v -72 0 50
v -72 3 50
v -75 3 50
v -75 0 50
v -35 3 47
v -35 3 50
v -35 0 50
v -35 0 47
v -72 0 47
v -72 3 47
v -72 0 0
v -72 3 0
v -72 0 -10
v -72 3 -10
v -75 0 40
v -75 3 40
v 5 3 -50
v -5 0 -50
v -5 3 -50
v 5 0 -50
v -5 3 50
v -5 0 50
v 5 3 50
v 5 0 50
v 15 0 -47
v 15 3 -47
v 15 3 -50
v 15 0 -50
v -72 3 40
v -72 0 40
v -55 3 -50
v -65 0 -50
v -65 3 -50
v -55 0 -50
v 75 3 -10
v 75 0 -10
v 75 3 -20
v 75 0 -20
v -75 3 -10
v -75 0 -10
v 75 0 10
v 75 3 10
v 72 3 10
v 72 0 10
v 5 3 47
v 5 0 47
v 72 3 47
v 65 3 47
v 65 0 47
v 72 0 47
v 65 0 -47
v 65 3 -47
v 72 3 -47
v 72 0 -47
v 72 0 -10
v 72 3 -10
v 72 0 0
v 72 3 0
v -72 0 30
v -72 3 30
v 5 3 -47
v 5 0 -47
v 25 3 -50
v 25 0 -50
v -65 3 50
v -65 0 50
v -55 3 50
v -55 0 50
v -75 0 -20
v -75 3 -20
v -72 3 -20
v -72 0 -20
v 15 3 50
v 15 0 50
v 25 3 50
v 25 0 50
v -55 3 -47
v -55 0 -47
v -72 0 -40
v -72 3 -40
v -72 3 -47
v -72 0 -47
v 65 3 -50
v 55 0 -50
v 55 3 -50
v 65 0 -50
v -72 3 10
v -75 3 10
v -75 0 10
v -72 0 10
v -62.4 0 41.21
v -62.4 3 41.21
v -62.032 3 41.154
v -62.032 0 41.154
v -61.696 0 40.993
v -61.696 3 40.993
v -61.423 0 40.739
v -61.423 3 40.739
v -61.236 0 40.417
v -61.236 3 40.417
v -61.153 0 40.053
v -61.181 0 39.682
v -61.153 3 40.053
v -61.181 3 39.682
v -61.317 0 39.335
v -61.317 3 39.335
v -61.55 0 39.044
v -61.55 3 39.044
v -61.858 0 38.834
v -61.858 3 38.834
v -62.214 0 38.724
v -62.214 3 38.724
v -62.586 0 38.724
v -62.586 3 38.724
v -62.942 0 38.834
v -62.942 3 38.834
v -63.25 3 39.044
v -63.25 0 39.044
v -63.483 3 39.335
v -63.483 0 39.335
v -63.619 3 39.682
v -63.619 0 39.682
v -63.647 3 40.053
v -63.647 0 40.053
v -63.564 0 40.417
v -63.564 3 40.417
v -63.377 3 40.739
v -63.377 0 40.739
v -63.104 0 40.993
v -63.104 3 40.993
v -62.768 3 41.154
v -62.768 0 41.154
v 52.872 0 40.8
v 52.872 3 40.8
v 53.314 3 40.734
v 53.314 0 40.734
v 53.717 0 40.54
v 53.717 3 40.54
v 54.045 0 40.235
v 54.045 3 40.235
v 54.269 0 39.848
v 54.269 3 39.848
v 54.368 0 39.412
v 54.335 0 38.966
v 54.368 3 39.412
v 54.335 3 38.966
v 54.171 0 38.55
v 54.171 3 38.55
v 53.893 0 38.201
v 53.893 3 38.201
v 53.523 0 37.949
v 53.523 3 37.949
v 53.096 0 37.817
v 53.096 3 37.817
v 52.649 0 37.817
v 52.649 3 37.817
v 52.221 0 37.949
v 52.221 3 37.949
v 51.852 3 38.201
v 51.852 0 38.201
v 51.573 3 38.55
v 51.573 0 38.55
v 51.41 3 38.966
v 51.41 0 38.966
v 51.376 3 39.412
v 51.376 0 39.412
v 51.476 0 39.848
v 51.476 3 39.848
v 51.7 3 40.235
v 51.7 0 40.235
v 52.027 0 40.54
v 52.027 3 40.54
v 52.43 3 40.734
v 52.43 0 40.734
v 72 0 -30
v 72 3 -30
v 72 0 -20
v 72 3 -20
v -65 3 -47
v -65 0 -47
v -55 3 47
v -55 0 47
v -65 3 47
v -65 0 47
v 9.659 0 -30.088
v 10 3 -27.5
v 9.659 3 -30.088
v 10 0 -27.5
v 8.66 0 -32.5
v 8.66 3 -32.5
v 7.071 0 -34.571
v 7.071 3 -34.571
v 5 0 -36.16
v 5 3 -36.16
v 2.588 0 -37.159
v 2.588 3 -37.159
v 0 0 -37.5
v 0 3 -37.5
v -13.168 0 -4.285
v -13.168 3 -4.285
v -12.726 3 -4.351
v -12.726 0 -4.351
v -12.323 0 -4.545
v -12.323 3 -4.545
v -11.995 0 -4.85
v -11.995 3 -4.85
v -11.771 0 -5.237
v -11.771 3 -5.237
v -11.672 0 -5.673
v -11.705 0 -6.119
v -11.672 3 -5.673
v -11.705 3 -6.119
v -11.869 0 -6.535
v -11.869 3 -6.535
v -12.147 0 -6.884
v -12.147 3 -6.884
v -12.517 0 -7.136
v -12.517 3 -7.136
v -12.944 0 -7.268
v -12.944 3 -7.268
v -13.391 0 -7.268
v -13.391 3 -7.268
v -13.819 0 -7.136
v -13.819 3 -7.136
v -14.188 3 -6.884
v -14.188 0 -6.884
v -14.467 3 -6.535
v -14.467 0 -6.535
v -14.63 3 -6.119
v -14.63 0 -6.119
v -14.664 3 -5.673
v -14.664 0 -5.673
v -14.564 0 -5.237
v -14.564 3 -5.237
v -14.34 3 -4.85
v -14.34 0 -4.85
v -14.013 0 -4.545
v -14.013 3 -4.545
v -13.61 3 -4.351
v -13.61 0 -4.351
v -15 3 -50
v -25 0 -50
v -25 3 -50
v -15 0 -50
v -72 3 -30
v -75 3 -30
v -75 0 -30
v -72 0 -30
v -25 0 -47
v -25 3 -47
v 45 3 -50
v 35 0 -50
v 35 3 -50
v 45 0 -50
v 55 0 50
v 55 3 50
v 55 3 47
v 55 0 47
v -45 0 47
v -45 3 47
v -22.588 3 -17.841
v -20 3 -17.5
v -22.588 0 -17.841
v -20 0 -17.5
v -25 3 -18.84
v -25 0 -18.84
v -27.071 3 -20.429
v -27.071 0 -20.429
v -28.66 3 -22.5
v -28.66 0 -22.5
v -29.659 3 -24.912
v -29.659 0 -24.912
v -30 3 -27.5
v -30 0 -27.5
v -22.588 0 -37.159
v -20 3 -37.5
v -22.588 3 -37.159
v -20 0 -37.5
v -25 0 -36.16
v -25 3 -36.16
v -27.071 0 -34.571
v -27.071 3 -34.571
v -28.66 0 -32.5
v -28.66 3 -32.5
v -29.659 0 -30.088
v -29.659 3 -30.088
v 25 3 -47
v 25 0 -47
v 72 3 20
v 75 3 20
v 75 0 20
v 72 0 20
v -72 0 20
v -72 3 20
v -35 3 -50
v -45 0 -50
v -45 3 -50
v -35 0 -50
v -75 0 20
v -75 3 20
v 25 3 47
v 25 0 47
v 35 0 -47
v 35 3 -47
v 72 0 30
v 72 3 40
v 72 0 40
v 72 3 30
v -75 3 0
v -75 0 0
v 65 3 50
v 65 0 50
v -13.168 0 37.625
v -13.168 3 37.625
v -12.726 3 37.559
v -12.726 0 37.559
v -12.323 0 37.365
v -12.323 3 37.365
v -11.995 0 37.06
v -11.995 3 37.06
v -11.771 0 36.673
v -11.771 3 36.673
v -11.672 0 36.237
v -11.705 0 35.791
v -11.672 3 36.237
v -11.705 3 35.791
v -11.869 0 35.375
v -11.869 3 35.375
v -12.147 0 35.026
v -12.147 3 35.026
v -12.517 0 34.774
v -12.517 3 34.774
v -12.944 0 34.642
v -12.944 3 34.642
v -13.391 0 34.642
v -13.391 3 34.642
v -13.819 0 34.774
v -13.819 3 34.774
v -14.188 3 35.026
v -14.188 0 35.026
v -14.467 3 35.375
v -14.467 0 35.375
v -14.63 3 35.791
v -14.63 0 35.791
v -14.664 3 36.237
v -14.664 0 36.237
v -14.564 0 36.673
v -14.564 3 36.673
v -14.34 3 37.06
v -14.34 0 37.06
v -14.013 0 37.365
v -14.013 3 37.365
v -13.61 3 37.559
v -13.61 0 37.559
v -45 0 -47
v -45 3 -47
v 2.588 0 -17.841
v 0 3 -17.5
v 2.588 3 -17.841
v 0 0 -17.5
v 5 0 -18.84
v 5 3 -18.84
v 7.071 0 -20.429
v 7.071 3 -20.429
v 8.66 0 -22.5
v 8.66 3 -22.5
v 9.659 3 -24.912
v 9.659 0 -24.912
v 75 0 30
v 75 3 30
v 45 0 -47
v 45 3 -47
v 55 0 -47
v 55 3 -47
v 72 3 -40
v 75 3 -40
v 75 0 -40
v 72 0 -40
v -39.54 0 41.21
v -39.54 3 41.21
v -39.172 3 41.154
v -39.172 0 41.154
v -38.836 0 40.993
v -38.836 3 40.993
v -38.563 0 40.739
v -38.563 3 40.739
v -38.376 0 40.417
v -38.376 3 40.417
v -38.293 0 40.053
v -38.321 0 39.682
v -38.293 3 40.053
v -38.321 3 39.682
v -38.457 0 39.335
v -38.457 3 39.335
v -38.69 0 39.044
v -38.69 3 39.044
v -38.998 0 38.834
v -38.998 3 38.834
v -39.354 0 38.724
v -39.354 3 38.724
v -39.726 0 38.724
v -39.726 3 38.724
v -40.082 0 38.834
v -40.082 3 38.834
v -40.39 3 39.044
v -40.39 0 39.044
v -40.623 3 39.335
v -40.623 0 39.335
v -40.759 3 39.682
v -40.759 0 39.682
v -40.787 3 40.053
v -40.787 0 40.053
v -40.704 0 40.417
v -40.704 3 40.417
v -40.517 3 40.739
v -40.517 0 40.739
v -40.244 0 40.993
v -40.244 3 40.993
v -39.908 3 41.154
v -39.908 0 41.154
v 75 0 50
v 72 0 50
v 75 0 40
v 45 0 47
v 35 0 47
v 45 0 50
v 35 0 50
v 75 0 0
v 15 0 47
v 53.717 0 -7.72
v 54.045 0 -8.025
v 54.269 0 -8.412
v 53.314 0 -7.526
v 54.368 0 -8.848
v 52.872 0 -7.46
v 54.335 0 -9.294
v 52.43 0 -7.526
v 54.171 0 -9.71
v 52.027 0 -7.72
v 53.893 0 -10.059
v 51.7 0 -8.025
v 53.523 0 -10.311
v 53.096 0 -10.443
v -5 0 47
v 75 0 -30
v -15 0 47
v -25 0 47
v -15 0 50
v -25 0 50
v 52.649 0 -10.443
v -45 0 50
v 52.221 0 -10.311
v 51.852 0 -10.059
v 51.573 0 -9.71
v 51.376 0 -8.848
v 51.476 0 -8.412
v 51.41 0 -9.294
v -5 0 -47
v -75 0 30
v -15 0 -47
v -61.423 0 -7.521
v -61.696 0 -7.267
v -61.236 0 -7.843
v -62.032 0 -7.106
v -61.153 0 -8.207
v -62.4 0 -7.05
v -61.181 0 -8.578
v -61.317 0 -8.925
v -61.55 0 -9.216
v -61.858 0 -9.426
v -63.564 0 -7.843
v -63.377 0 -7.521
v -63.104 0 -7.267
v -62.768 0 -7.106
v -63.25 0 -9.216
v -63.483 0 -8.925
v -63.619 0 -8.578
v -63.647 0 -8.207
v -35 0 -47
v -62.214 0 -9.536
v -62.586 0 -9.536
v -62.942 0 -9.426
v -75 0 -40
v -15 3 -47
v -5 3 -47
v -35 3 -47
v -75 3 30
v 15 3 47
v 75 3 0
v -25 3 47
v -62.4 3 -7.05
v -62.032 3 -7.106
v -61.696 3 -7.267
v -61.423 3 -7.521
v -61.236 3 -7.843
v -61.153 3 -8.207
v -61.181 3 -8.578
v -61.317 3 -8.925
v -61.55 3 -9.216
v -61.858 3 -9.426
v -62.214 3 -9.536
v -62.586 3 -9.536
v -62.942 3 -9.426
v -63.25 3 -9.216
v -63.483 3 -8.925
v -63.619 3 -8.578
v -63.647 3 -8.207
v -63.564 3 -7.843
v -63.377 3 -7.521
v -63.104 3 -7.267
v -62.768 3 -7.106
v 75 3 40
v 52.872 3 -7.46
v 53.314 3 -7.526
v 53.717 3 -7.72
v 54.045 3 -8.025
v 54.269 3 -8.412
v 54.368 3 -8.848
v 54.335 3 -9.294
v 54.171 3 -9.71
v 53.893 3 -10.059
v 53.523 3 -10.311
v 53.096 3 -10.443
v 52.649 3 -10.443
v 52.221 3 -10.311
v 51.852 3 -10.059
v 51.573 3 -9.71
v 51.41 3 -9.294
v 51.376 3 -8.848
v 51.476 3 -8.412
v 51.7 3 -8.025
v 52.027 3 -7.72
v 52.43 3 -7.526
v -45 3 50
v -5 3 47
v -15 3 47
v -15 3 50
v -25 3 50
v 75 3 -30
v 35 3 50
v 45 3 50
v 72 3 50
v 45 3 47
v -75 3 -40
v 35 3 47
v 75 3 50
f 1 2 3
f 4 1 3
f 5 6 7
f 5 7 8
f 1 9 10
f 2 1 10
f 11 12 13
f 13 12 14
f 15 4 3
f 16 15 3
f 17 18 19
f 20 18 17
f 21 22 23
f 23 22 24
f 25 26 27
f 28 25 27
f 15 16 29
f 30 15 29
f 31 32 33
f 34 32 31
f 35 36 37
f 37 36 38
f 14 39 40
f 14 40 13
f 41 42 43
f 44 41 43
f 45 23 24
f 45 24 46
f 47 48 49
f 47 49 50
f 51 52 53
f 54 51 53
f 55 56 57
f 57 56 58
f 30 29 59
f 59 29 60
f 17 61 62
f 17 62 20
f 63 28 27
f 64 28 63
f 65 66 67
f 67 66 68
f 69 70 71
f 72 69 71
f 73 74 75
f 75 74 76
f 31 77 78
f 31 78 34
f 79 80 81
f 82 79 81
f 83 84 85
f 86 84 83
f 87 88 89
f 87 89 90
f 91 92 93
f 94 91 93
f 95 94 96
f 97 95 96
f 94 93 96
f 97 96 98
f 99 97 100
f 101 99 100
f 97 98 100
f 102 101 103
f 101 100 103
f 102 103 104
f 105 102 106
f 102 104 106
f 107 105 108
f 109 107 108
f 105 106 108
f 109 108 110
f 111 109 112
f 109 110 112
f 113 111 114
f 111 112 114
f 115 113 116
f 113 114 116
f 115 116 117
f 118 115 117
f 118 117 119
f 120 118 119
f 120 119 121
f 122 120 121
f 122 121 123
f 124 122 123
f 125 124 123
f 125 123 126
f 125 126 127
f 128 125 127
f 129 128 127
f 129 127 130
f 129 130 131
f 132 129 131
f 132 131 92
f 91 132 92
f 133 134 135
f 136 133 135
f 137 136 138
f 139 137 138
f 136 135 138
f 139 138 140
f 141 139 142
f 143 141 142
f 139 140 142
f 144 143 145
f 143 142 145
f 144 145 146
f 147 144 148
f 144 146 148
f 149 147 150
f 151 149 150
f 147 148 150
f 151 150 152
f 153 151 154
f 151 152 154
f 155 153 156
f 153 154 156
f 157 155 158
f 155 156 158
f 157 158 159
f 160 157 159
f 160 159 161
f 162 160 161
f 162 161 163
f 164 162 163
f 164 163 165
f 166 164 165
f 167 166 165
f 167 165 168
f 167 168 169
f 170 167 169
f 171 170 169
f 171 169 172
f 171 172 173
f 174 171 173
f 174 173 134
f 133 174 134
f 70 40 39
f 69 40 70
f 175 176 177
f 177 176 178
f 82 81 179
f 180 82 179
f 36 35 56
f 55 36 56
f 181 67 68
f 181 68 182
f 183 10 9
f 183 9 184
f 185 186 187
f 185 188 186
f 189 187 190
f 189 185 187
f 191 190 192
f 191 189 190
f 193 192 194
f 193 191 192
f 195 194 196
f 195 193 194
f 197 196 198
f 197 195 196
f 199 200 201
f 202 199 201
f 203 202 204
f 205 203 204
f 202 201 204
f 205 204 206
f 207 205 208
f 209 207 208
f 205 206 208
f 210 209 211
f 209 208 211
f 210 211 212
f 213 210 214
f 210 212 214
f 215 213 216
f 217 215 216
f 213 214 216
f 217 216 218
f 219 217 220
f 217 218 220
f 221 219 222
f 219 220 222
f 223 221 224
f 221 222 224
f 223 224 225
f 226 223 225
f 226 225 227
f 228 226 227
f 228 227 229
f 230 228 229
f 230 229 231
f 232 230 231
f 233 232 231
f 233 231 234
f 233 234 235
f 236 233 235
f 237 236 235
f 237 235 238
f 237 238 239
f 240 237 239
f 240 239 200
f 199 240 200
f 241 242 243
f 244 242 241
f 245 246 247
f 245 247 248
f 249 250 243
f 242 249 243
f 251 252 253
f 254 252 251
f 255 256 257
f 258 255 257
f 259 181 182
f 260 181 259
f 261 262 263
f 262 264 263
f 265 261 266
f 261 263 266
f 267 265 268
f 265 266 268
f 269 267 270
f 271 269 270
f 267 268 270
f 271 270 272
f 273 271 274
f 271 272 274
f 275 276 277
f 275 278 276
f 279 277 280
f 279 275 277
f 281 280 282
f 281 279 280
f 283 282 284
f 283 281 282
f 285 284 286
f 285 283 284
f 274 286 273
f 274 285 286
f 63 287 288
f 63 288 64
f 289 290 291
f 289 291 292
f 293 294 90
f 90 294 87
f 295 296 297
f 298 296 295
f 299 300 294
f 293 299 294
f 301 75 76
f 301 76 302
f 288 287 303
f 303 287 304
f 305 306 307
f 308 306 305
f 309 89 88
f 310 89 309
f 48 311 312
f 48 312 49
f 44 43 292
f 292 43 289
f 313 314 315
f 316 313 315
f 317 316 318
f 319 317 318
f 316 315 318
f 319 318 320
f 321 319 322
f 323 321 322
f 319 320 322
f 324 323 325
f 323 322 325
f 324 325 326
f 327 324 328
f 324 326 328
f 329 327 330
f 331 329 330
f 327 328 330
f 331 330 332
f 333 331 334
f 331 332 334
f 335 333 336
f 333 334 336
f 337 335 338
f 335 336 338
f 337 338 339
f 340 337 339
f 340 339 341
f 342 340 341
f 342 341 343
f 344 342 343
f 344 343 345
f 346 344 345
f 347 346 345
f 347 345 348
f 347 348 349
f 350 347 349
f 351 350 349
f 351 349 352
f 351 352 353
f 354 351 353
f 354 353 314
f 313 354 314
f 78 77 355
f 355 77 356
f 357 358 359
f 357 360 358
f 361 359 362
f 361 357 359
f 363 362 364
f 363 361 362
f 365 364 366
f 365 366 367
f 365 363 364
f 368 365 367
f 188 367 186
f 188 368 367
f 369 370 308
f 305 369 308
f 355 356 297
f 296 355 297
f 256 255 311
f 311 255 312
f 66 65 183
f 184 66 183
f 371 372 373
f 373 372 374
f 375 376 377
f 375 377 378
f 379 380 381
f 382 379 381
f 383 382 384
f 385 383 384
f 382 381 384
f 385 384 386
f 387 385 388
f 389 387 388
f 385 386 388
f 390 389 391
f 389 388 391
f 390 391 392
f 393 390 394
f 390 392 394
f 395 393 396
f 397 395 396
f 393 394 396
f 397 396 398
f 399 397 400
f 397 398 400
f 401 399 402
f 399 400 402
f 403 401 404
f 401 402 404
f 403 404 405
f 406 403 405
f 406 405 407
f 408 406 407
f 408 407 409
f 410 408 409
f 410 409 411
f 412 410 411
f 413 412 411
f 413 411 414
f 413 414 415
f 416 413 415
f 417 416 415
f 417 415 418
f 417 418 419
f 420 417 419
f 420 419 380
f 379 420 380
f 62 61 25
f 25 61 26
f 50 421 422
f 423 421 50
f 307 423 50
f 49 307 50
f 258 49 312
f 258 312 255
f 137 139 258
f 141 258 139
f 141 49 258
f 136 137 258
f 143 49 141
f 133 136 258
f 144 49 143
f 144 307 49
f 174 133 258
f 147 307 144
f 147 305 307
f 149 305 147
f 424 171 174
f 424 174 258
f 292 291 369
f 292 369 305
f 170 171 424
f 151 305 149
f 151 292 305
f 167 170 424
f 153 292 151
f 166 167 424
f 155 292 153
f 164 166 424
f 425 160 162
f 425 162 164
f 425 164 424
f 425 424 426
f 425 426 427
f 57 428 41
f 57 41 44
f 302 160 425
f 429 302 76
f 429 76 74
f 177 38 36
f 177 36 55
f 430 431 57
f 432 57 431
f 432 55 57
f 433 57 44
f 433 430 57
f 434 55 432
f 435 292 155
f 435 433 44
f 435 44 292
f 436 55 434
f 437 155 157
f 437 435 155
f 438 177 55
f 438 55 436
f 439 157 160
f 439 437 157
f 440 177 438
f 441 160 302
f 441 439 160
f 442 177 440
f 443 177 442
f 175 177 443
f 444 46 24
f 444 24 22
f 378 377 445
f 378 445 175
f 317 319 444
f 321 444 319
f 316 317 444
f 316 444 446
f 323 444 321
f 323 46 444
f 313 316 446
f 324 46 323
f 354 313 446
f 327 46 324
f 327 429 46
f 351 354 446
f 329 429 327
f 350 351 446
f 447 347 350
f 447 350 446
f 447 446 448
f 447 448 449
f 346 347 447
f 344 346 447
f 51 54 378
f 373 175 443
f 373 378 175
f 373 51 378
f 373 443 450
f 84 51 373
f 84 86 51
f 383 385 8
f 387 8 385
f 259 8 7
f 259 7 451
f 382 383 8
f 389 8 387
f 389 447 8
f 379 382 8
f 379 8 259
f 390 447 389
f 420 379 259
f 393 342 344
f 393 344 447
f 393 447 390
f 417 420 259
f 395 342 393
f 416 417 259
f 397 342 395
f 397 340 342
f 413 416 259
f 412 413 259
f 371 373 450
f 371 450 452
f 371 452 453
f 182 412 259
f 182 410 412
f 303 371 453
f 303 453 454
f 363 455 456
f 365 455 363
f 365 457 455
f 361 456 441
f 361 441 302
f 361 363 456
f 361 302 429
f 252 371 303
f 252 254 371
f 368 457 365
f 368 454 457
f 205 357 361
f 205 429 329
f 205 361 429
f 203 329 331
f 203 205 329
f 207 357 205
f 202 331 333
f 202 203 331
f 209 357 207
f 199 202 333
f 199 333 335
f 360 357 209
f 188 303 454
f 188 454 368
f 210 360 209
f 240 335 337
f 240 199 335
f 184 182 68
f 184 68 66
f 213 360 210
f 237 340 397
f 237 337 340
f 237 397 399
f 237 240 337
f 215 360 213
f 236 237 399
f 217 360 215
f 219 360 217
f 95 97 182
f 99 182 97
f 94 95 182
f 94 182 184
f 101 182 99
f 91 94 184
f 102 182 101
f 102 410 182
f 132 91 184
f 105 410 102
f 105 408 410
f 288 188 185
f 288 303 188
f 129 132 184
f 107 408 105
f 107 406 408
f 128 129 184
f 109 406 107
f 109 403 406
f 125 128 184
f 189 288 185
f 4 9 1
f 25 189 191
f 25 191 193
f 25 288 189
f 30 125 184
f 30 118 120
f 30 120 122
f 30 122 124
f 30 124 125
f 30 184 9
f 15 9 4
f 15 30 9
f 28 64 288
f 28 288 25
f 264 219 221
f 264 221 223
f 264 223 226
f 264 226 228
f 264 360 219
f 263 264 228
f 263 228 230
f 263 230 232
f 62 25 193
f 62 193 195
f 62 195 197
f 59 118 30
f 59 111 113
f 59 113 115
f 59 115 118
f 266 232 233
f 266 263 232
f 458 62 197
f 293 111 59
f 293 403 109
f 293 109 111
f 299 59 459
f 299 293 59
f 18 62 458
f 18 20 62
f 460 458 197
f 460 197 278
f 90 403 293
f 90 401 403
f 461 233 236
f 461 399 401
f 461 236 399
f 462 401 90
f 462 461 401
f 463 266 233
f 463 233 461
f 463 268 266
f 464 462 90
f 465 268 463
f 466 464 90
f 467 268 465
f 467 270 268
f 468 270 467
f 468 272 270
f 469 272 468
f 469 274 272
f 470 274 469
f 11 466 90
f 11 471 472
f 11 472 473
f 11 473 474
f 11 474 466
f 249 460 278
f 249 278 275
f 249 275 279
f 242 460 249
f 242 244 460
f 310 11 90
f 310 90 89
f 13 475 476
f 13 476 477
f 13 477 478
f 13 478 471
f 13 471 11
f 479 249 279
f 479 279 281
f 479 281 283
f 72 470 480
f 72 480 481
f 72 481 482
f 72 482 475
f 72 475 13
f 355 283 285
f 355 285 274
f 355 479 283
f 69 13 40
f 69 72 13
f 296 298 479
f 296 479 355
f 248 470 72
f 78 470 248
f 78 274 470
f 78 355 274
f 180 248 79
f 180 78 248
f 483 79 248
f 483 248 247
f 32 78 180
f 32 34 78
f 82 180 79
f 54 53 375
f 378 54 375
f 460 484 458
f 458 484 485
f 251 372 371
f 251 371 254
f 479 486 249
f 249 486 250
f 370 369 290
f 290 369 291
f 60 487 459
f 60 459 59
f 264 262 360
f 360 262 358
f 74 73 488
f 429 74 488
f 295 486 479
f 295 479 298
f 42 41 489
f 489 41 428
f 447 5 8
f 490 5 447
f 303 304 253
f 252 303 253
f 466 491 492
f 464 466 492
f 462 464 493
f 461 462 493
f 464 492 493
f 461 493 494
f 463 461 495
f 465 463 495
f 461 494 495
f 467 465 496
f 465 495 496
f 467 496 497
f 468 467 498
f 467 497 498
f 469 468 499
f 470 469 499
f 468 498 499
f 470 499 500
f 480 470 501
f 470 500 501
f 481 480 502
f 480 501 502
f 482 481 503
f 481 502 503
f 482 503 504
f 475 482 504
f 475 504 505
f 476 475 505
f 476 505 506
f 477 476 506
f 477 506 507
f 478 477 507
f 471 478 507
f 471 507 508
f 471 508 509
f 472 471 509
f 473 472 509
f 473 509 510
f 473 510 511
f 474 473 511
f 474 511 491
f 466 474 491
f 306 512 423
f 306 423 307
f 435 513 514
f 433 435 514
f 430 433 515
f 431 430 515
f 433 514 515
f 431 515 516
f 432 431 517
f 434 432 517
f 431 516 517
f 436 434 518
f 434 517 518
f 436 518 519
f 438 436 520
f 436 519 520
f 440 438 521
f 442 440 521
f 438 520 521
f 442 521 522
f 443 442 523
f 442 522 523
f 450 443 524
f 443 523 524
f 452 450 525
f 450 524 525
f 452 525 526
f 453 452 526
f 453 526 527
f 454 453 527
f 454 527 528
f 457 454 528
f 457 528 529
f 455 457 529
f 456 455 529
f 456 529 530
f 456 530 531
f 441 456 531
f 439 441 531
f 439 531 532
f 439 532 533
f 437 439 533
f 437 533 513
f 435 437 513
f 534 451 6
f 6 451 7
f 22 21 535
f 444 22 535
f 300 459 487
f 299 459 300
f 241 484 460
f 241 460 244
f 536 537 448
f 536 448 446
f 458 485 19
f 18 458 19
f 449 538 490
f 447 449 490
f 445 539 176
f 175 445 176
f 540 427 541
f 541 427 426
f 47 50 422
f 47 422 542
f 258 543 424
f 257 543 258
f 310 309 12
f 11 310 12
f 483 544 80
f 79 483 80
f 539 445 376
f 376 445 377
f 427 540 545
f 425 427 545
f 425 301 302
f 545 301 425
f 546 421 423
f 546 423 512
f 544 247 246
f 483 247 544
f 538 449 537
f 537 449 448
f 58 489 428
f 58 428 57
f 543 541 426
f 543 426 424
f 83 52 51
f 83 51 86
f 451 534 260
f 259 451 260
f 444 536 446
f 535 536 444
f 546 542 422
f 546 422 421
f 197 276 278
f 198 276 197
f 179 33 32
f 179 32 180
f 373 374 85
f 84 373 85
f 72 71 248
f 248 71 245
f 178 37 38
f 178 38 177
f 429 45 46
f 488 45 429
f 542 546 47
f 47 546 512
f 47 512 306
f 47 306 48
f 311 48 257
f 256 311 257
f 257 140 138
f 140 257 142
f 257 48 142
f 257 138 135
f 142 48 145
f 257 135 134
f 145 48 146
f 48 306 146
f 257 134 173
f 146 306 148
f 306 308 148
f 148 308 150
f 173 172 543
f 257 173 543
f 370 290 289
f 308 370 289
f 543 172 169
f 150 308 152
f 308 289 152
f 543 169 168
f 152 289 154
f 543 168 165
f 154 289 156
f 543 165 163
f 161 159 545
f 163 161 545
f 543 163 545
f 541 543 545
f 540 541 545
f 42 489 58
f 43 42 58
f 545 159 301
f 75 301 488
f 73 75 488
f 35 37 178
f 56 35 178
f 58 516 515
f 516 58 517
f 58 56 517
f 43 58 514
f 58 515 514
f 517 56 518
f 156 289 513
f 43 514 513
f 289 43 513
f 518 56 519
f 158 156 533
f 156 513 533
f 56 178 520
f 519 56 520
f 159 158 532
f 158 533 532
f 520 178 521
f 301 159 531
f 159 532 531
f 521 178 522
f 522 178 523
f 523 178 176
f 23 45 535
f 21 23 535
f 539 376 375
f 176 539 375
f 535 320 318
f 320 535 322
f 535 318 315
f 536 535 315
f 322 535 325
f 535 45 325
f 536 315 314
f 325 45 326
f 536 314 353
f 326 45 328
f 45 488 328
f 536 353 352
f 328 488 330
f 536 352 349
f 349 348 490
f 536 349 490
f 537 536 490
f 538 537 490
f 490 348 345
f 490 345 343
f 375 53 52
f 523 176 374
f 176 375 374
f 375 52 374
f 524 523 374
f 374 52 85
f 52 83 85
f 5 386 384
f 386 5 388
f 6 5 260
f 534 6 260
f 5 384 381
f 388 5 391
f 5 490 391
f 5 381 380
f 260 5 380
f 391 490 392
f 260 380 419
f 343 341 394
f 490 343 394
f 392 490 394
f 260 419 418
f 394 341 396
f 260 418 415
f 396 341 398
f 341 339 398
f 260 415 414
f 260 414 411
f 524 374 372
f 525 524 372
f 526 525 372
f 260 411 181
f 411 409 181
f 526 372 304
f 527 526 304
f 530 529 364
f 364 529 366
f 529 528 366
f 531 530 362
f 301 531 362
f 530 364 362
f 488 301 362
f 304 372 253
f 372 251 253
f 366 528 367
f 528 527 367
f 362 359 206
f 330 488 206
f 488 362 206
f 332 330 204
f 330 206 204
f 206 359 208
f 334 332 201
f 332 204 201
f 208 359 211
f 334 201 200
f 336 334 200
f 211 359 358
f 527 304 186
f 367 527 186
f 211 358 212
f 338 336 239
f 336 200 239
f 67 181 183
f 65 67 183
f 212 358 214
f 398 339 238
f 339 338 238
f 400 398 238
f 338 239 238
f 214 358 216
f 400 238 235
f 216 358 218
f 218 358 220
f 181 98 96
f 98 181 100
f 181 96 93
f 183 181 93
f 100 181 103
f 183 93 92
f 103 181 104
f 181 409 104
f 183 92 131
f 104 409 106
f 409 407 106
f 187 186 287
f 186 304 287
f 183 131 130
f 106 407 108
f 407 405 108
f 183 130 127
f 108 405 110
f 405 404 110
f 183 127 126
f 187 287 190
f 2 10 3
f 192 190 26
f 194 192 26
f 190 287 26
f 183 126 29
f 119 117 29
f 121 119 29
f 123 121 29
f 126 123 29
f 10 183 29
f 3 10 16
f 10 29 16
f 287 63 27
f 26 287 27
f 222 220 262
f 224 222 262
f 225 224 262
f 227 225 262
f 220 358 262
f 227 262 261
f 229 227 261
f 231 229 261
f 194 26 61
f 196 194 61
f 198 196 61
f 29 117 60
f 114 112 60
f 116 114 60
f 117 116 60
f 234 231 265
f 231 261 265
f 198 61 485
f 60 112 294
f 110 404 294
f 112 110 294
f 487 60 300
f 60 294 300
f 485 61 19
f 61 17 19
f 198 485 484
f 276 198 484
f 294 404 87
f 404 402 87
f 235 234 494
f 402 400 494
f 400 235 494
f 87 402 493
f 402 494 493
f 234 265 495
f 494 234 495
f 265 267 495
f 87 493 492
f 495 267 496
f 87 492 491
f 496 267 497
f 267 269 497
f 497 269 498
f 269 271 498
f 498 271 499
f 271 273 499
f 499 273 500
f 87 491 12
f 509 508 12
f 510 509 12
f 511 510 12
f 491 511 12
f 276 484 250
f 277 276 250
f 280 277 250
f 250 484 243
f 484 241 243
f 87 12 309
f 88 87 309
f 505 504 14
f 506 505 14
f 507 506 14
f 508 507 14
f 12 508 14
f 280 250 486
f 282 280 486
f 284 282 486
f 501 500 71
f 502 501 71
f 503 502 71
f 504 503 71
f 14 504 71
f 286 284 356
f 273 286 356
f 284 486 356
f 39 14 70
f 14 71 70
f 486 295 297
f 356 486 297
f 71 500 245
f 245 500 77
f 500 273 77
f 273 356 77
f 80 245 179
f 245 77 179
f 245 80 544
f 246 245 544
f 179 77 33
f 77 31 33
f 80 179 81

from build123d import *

# Parameters (mm, degrees)
SKETCH1_W               = 150
SKETCH1_H               = 100
BOSS_EXTRUDE1_DEPTH     = 3
SKETCH2_W               = 10
SKETCH2_H               = 3
CUT_EXTRUDE2_DEPTH      = 91.188691087
LPATTERN1_COUNT         = 8
LPATTERN1_PITCH         = 20
MIRROR1_COPY_1_SKETCH_W = 10
MIRROR1_COPY_1_SKETCH_H = 3
MIRROR1_COPY_1_DEPTH    = 91.188691087
MIRROR1_COPY_2_SKETCH_W = 10
MIRROR1_COPY_2_SKETCH_H = 3
MIRROR1_COPY_2_DEPTH    = 91.188691087
MIRROR1_COPY_3_SKETCH_W = 10
MIRROR1_COPY_3_SKETCH_H = 3
MIRROR1_COPY_3_DEPTH    = 91.188691087
MIRROR1_COPY_4_SKETCH_W = 10
MIRROR1_COPY_4_SKETCH_H = 3
MIRROR1_COPY_4_DEPTH    = 91.188691087
MIRROR1_COPY_5_SKETCH_W = 10
MIRROR1_COPY_5_SKETCH_H = 3
MIRROR1_COPY_5_DEPTH    = 91.188691087
MIRROR1_COPY_6_SKETCH_W = 10
MIRROR1_COPY_6_SKETCH_H = 3
MIRROR1_COPY_6_DEPTH    = 91.188691087
MIRROR1_COPY_7_SKETCH_W = 10
MIRROR1_COPY_7_SKETCH_H = 3
MIRROR1_COPY_7_DEPTH    = 91.188691087
SKETCH3_W               = 3
SKETCH3_H               = 10
CUT_EXTRUDE3_DEPTH      = 91.188691087
LPATTERN2_COUNT         = 5
LPATTERN2_PITCH         = 20
MIRROR2_COPY_1_SKETCH_W = 3
MIRROR2_COPY_1_SKETCH_H = 10
MIRROR2_COPY_1_DEPTH    = 91.188691087
MIRROR2_COPY_2_SKETCH_W = 3
MIRROR2_COPY_2_SKETCH_H = 10
MIRROR2_COPY_2_DEPTH    = 91.188691087
MIRROR2_COPY_3_SKETCH_W = 3
MIRROR2_COPY_3_SKETCH_H = 10
MIRROR2_COPY_3_DEPTH    = 91.188691087
MIRROR2_COPY_4_SKETCH_W = 3
MIRROR2_COPY_4_SKETCH_H = 10
MIRROR2_COPY_4_DEPTH    = 91.188691087
SKETCH4_W               = 40
SKETCH4_H               = 20
CUT_EXTRUDE4_DEPTH      = 91.188691087
FILLET1_R               = 10
SKETCH5_W               = 3
SKETCH5_H               = 3
BOSS_EXTRUDE2_DEPTH     = 3
SKETCH6_R               = 1.5
SKETCH6_R_2             = 1.25
CUT_EXTRUDE5_DEPTH      = 91.188691087


with BuildPart() as part:
    # Sketch1 → Boss-Extrude1 (new body)
    with BuildSketch(Plane(origin=(0, 0, 0), x_dir=(1, 0, 0), z_dir=(0, 1, 0))):
        Rectangle(SKETCH1_W, SKETCH1_H)
    extrude(amount=BOSS_EXTRUDE1_DEPTH)

    # Sketch2 → Cut-Extrude2 (cut, through all)
    with BuildSketch(Plane(origin=(0, 3, 0), x_dir=(1, 0, 0), z_dir=(0, 1, 0))):
        with Locations((-70, -48.5)):
            Rectangle(SKETCH2_W, SKETCH2_H)
    cut_extrude2 = extrude(amount=-CUT_EXTRUDE2_DEPTH, mode=Mode.SUBTRACT)

    # LPattern1: Cut-Extrude2 ×8
    with Locations(*[(i * LPATTERN1_PITCH, 0, 0) for i in range(1, LPATTERN1_COUNT)]):
        add(cut_extrude2, mode=Mode.SUBTRACT)

    # Mirror1: Cut-Extrude2 across plane
    add(cut_extrude2.mirror(Plane.XY), mode=Mode.SUBTRACT)

    # Mirror1 copy 1 sketch → Mirror1 copy 1 (cut, through all)
    with BuildSketch(Plane(origin=(20, 3, 0), x_dir=(1, 0, 0), z_dir=(0, 1, 0))):
        with Locations((-70, 48.5)):
            Rectangle(MIRROR1_COPY_1_SKETCH_W, MIRROR1_COPY_1_SKETCH_H)
    extrude(amount=-MIRROR1_COPY_1_DEPTH, mode=Mode.SUBTRACT)

    # Mirror1 copy 2 sketch → Mirror1 copy 2 (cut, through all)
    with BuildSketch(Plane(origin=(40, 3, 0), x_dir=(1, 0, 0), z_dir=(0, 1, 0))):
        with Locations((-70, 48.5)):
            Rectangle(MIRROR1_COPY_2_SKETCH_W, MIRROR1_COPY_2_SKETCH_H)
    extrude(amount=-MIRROR1_COPY_2_DEPTH, mode=Mode.SUBTRACT)

    # Mirror1 copy 3 sketch → Mirror1 copy 3 (cut, through all)
    with BuildSketch(Plane(origin=(60, 3, 0), x_dir=(1, 0, 0), z_dir=(0, 1, 0))):
        with Locations((-70, 48.5)):
            Rectangle(MIRROR1_COPY_3_SKETCH_W, MIRROR1_COPY_3_SKETCH_H)
    extrude(amount=-MIRROR1_COPY_3_DEPTH, mode=Mode.SUBTRACT)

    # Mirror1 copy 4 sketch → Mirror1 copy 4 (cut, through all)
    with BuildSketch(Plane(origin=(80, 3, 0), x_dir=(1, 0, 0), z_dir=(0, 1, 0))):
        with Locations((-70, 48.5)):
            Rectangle(MIRROR1_COPY_4_SKETCH_W, MIRROR1_COPY_4_SKETCH_H)
    extrude(amount=-MIRROR1_COPY_4_DEPTH, mode=Mode.SUBTRACT)

    # Mirror1 copy 5 sketch → Mirror1 copy 5 (cut, through all)
    with BuildSketch(Plane(origin=(100, 3, 0), x_dir=(1, 0, 0), z_dir=(0, 1, 0))):
        with Locations((-70, 48.5)):
            Rectangle(MIRROR1_COPY_5_SKETCH_W, MIRROR1_COPY_5_SKETCH_H)
    extrude(amount=-MIRROR1_COPY_5_DEPTH, mode=Mode.SUBTRACT)

    # Mirror1 copy 6 sketch → Mirror1 copy 6 (cut, through all)
    with BuildSketch(Plane(origin=(120, 3, 0), x_dir=(1, 0, 0), z_dir=(0, 1, 0))):
        with Locations((-70, 48.5)):
            Rectangle(MIRROR1_COPY_6_SKETCH_W, MIRROR1_COPY_6_SKETCH_H)
    extrude(amount=-MIRROR1_COPY_6_DEPTH, mode=Mode.SUBTRACT)

    # Mirror1 copy 7 sketch → Mirror1 copy 7 (cut, through all)
    with BuildSketch(Plane(origin=(140, 3, 0), x_dir=(1, 0, 0), z_dir=(0, 1, 0))):
        with Locations((-70, 48.5)):
            Rectangle(MIRROR1_COPY_7_SKETCH_W, MIRROR1_COPY_7_SKETCH_H)
    extrude(amount=-MIRROR1_COPY_7_DEPTH, mode=Mode.SUBTRACT)

    # Sketch3 → Cut-Extrude3 (cut, through all)
    with BuildSketch(Plane(origin=(0, 3, 0), x_dir=(1, 0, 0), z_dir=(0, 1, 0))):
        with Locations((-73.5, -35)):
            Rectangle(SKETCH3_W, SKETCH3_H)
    cut_extrude3 = extrude(amount=-CUT_EXTRUDE3_DEPTH, mode=Mode.SUBTRACT)

    # LPattern2: Cut-Extrude3 ×5
    with Locations(*[(0, 0, -i * LPATTERN2_PITCH) for i in range(1, LPATTERN2_COUNT)]):
        add(cut_extrude3, mode=Mode.SUBTRACT)

    # Mirror2: Cut-Extrude3 across plane
    add(cut_extrude3.mirror(Plane(origin=(0, 0, 0), x_dir=(0, 0, 1), z_dir=(1, 0, 0))), mode=Mode.SUBTRACT)

    # Mirror2 copy 1 sketch → Mirror2 copy 1 (cut, through all)
    with BuildSketch(Plane(origin=(0, 3, -20), x_dir=(-1, 0, 0), z_dir=(0, 1, 0))):
        with Locations((-73.5, 35)):
            Rectangle(MIRROR2_COPY_1_SKETCH_W, MIRROR2_COPY_1_SKETCH_H)
    extrude(amount=-MIRROR2_COPY_1_DEPTH, mode=Mode.SUBTRACT)

    # Mirror2 copy 2 sketch → Mirror2 copy 2 (cut, through all)
    with BuildSketch(Plane(origin=(0, 3, -40), x_dir=(-1, 0, 0), z_dir=(0, 1, 0))):
        with Locations((-73.5, 35)):
            Rectangle(MIRROR2_COPY_2_SKETCH_W, MIRROR2_COPY_2_SKETCH_H)
    extrude(amount=-MIRROR2_COPY_2_DEPTH, mode=Mode.SUBTRACT)

    # Mirror2 copy 3 sketch → Mirror2 copy 3 (cut, through all)
    with BuildSketch(Plane(origin=(0, 3, -60), x_dir=(-1, 0, 0), z_dir=(0, 1, 0))):
        with Locations((-73.5, 35)):
            Rectangle(MIRROR2_COPY_3_SKETCH_W, MIRROR2_COPY_3_SKETCH_H)
    extrude(amount=-MIRROR2_COPY_3_DEPTH, mode=Mode.SUBTRACT)

    # Mirror2 copy 4 sketch → Mirror2 copy 4 (cut, through all)
    with BuildSketch(Plane(origin=(0, 3, -80), x_dir=(-1, 0, 0), z_dir=(0, 1, 0))):
        with Locations((-73.5, 35)):
            Rectangle(MIRROR2_COPY_4_SKETCH_W, MIRROR2_COPY_4_SKETCH_H)
    extrude(amount=-MIRROR2_COPY_4_DEPTH, mode=Mode.SUBTRACT)

    # Sketch4 → Cut-Extrude4 (cut, through all)
    with BuildSketch(Plane(origin=(0, 3, 0), x_dir=(1, 0, 0), z_dir=(0, 1, 0))):
        with Locations((-10, 27.5)):
            Rectangle(SKETCH4_W, SKETCH4_H)
    extrude(amount=-CUT_EXTRUDE4_DEPTH, mode=Mode.SUBTRACT)

    # Fillet1
    fillet1_edges = [part.edges().sort_by_distance(p)[0] for p in [
        (10, 1.5, -17.5),
        (10, 1.5, -37.5),
        (-30, 1.5, -37.5),
        (-30, 1.5, -17.5),
    ]]
    fillet(fillet1_edges, radius=FILLET1_R - 0.0001)  # a hair under: the kernel refuses the full size

    # Sketch5 → Boss-Extrude2 (add)
    with BuildSketch(Plane.XY.offset(47)):
        with Locations((73.5, 1.5)):
            Rectangle(SKETCH5_W, SKETCH5_H)
    boss_extrude2 = extrude(amount=BOSS_EXTRUDE2_DEPTH)

    # Mirror3: Boss-Extrude2 across plane
    add(boss_extrude2.mirror(Plane(origin=(0, 0, 0), x_dir=(0, 0, 1), z_dir=(1, 0, 0))))

    # Sketch6 → Cut-Extrude5 (cut, through all)
    with BuildSketch(Plane(origin=(0, 3, 0), x_dir=(1, 0, 0), z_dir=(0, 1, 0))):
        with Locations(Location((-13.16772538, -36.12518928, 0), (0, 0, 270))):
            Circle(SKETCH6_R)
        with Locations(Location((-13.16772538, 5.78481072, 0), (0, 0, 270))):
            Circle(SKETCH6_R)
        with Locations(Location((52.87227462, 8.95981072, 0), (0, 0, 270))):
            Circle(SKETCH6_R)
        with Locations(Location((52.87227462, -39.30018928, 0), (0, 0, 270))):
            Circle(SKETCH6_R)
        with Locations(Location((-39.54, -39.96, 0), (0, 0, 270))):
            Circle(SKETCH6_R_2)
        with Locations(Location((-62.4, -39.96, 0), (0, 0, 270))):
            Circle(SKETCH6_R_2)
        with Locations(Location((-62.4, 8.3, 0), (0, 0, 270))):
            Circle(SKETCH6_R_2)
    extrude(amount=-CUT_EXTRUDE5_DEPTH, mode=Mode.SUBTRACT)


solid = part.part
